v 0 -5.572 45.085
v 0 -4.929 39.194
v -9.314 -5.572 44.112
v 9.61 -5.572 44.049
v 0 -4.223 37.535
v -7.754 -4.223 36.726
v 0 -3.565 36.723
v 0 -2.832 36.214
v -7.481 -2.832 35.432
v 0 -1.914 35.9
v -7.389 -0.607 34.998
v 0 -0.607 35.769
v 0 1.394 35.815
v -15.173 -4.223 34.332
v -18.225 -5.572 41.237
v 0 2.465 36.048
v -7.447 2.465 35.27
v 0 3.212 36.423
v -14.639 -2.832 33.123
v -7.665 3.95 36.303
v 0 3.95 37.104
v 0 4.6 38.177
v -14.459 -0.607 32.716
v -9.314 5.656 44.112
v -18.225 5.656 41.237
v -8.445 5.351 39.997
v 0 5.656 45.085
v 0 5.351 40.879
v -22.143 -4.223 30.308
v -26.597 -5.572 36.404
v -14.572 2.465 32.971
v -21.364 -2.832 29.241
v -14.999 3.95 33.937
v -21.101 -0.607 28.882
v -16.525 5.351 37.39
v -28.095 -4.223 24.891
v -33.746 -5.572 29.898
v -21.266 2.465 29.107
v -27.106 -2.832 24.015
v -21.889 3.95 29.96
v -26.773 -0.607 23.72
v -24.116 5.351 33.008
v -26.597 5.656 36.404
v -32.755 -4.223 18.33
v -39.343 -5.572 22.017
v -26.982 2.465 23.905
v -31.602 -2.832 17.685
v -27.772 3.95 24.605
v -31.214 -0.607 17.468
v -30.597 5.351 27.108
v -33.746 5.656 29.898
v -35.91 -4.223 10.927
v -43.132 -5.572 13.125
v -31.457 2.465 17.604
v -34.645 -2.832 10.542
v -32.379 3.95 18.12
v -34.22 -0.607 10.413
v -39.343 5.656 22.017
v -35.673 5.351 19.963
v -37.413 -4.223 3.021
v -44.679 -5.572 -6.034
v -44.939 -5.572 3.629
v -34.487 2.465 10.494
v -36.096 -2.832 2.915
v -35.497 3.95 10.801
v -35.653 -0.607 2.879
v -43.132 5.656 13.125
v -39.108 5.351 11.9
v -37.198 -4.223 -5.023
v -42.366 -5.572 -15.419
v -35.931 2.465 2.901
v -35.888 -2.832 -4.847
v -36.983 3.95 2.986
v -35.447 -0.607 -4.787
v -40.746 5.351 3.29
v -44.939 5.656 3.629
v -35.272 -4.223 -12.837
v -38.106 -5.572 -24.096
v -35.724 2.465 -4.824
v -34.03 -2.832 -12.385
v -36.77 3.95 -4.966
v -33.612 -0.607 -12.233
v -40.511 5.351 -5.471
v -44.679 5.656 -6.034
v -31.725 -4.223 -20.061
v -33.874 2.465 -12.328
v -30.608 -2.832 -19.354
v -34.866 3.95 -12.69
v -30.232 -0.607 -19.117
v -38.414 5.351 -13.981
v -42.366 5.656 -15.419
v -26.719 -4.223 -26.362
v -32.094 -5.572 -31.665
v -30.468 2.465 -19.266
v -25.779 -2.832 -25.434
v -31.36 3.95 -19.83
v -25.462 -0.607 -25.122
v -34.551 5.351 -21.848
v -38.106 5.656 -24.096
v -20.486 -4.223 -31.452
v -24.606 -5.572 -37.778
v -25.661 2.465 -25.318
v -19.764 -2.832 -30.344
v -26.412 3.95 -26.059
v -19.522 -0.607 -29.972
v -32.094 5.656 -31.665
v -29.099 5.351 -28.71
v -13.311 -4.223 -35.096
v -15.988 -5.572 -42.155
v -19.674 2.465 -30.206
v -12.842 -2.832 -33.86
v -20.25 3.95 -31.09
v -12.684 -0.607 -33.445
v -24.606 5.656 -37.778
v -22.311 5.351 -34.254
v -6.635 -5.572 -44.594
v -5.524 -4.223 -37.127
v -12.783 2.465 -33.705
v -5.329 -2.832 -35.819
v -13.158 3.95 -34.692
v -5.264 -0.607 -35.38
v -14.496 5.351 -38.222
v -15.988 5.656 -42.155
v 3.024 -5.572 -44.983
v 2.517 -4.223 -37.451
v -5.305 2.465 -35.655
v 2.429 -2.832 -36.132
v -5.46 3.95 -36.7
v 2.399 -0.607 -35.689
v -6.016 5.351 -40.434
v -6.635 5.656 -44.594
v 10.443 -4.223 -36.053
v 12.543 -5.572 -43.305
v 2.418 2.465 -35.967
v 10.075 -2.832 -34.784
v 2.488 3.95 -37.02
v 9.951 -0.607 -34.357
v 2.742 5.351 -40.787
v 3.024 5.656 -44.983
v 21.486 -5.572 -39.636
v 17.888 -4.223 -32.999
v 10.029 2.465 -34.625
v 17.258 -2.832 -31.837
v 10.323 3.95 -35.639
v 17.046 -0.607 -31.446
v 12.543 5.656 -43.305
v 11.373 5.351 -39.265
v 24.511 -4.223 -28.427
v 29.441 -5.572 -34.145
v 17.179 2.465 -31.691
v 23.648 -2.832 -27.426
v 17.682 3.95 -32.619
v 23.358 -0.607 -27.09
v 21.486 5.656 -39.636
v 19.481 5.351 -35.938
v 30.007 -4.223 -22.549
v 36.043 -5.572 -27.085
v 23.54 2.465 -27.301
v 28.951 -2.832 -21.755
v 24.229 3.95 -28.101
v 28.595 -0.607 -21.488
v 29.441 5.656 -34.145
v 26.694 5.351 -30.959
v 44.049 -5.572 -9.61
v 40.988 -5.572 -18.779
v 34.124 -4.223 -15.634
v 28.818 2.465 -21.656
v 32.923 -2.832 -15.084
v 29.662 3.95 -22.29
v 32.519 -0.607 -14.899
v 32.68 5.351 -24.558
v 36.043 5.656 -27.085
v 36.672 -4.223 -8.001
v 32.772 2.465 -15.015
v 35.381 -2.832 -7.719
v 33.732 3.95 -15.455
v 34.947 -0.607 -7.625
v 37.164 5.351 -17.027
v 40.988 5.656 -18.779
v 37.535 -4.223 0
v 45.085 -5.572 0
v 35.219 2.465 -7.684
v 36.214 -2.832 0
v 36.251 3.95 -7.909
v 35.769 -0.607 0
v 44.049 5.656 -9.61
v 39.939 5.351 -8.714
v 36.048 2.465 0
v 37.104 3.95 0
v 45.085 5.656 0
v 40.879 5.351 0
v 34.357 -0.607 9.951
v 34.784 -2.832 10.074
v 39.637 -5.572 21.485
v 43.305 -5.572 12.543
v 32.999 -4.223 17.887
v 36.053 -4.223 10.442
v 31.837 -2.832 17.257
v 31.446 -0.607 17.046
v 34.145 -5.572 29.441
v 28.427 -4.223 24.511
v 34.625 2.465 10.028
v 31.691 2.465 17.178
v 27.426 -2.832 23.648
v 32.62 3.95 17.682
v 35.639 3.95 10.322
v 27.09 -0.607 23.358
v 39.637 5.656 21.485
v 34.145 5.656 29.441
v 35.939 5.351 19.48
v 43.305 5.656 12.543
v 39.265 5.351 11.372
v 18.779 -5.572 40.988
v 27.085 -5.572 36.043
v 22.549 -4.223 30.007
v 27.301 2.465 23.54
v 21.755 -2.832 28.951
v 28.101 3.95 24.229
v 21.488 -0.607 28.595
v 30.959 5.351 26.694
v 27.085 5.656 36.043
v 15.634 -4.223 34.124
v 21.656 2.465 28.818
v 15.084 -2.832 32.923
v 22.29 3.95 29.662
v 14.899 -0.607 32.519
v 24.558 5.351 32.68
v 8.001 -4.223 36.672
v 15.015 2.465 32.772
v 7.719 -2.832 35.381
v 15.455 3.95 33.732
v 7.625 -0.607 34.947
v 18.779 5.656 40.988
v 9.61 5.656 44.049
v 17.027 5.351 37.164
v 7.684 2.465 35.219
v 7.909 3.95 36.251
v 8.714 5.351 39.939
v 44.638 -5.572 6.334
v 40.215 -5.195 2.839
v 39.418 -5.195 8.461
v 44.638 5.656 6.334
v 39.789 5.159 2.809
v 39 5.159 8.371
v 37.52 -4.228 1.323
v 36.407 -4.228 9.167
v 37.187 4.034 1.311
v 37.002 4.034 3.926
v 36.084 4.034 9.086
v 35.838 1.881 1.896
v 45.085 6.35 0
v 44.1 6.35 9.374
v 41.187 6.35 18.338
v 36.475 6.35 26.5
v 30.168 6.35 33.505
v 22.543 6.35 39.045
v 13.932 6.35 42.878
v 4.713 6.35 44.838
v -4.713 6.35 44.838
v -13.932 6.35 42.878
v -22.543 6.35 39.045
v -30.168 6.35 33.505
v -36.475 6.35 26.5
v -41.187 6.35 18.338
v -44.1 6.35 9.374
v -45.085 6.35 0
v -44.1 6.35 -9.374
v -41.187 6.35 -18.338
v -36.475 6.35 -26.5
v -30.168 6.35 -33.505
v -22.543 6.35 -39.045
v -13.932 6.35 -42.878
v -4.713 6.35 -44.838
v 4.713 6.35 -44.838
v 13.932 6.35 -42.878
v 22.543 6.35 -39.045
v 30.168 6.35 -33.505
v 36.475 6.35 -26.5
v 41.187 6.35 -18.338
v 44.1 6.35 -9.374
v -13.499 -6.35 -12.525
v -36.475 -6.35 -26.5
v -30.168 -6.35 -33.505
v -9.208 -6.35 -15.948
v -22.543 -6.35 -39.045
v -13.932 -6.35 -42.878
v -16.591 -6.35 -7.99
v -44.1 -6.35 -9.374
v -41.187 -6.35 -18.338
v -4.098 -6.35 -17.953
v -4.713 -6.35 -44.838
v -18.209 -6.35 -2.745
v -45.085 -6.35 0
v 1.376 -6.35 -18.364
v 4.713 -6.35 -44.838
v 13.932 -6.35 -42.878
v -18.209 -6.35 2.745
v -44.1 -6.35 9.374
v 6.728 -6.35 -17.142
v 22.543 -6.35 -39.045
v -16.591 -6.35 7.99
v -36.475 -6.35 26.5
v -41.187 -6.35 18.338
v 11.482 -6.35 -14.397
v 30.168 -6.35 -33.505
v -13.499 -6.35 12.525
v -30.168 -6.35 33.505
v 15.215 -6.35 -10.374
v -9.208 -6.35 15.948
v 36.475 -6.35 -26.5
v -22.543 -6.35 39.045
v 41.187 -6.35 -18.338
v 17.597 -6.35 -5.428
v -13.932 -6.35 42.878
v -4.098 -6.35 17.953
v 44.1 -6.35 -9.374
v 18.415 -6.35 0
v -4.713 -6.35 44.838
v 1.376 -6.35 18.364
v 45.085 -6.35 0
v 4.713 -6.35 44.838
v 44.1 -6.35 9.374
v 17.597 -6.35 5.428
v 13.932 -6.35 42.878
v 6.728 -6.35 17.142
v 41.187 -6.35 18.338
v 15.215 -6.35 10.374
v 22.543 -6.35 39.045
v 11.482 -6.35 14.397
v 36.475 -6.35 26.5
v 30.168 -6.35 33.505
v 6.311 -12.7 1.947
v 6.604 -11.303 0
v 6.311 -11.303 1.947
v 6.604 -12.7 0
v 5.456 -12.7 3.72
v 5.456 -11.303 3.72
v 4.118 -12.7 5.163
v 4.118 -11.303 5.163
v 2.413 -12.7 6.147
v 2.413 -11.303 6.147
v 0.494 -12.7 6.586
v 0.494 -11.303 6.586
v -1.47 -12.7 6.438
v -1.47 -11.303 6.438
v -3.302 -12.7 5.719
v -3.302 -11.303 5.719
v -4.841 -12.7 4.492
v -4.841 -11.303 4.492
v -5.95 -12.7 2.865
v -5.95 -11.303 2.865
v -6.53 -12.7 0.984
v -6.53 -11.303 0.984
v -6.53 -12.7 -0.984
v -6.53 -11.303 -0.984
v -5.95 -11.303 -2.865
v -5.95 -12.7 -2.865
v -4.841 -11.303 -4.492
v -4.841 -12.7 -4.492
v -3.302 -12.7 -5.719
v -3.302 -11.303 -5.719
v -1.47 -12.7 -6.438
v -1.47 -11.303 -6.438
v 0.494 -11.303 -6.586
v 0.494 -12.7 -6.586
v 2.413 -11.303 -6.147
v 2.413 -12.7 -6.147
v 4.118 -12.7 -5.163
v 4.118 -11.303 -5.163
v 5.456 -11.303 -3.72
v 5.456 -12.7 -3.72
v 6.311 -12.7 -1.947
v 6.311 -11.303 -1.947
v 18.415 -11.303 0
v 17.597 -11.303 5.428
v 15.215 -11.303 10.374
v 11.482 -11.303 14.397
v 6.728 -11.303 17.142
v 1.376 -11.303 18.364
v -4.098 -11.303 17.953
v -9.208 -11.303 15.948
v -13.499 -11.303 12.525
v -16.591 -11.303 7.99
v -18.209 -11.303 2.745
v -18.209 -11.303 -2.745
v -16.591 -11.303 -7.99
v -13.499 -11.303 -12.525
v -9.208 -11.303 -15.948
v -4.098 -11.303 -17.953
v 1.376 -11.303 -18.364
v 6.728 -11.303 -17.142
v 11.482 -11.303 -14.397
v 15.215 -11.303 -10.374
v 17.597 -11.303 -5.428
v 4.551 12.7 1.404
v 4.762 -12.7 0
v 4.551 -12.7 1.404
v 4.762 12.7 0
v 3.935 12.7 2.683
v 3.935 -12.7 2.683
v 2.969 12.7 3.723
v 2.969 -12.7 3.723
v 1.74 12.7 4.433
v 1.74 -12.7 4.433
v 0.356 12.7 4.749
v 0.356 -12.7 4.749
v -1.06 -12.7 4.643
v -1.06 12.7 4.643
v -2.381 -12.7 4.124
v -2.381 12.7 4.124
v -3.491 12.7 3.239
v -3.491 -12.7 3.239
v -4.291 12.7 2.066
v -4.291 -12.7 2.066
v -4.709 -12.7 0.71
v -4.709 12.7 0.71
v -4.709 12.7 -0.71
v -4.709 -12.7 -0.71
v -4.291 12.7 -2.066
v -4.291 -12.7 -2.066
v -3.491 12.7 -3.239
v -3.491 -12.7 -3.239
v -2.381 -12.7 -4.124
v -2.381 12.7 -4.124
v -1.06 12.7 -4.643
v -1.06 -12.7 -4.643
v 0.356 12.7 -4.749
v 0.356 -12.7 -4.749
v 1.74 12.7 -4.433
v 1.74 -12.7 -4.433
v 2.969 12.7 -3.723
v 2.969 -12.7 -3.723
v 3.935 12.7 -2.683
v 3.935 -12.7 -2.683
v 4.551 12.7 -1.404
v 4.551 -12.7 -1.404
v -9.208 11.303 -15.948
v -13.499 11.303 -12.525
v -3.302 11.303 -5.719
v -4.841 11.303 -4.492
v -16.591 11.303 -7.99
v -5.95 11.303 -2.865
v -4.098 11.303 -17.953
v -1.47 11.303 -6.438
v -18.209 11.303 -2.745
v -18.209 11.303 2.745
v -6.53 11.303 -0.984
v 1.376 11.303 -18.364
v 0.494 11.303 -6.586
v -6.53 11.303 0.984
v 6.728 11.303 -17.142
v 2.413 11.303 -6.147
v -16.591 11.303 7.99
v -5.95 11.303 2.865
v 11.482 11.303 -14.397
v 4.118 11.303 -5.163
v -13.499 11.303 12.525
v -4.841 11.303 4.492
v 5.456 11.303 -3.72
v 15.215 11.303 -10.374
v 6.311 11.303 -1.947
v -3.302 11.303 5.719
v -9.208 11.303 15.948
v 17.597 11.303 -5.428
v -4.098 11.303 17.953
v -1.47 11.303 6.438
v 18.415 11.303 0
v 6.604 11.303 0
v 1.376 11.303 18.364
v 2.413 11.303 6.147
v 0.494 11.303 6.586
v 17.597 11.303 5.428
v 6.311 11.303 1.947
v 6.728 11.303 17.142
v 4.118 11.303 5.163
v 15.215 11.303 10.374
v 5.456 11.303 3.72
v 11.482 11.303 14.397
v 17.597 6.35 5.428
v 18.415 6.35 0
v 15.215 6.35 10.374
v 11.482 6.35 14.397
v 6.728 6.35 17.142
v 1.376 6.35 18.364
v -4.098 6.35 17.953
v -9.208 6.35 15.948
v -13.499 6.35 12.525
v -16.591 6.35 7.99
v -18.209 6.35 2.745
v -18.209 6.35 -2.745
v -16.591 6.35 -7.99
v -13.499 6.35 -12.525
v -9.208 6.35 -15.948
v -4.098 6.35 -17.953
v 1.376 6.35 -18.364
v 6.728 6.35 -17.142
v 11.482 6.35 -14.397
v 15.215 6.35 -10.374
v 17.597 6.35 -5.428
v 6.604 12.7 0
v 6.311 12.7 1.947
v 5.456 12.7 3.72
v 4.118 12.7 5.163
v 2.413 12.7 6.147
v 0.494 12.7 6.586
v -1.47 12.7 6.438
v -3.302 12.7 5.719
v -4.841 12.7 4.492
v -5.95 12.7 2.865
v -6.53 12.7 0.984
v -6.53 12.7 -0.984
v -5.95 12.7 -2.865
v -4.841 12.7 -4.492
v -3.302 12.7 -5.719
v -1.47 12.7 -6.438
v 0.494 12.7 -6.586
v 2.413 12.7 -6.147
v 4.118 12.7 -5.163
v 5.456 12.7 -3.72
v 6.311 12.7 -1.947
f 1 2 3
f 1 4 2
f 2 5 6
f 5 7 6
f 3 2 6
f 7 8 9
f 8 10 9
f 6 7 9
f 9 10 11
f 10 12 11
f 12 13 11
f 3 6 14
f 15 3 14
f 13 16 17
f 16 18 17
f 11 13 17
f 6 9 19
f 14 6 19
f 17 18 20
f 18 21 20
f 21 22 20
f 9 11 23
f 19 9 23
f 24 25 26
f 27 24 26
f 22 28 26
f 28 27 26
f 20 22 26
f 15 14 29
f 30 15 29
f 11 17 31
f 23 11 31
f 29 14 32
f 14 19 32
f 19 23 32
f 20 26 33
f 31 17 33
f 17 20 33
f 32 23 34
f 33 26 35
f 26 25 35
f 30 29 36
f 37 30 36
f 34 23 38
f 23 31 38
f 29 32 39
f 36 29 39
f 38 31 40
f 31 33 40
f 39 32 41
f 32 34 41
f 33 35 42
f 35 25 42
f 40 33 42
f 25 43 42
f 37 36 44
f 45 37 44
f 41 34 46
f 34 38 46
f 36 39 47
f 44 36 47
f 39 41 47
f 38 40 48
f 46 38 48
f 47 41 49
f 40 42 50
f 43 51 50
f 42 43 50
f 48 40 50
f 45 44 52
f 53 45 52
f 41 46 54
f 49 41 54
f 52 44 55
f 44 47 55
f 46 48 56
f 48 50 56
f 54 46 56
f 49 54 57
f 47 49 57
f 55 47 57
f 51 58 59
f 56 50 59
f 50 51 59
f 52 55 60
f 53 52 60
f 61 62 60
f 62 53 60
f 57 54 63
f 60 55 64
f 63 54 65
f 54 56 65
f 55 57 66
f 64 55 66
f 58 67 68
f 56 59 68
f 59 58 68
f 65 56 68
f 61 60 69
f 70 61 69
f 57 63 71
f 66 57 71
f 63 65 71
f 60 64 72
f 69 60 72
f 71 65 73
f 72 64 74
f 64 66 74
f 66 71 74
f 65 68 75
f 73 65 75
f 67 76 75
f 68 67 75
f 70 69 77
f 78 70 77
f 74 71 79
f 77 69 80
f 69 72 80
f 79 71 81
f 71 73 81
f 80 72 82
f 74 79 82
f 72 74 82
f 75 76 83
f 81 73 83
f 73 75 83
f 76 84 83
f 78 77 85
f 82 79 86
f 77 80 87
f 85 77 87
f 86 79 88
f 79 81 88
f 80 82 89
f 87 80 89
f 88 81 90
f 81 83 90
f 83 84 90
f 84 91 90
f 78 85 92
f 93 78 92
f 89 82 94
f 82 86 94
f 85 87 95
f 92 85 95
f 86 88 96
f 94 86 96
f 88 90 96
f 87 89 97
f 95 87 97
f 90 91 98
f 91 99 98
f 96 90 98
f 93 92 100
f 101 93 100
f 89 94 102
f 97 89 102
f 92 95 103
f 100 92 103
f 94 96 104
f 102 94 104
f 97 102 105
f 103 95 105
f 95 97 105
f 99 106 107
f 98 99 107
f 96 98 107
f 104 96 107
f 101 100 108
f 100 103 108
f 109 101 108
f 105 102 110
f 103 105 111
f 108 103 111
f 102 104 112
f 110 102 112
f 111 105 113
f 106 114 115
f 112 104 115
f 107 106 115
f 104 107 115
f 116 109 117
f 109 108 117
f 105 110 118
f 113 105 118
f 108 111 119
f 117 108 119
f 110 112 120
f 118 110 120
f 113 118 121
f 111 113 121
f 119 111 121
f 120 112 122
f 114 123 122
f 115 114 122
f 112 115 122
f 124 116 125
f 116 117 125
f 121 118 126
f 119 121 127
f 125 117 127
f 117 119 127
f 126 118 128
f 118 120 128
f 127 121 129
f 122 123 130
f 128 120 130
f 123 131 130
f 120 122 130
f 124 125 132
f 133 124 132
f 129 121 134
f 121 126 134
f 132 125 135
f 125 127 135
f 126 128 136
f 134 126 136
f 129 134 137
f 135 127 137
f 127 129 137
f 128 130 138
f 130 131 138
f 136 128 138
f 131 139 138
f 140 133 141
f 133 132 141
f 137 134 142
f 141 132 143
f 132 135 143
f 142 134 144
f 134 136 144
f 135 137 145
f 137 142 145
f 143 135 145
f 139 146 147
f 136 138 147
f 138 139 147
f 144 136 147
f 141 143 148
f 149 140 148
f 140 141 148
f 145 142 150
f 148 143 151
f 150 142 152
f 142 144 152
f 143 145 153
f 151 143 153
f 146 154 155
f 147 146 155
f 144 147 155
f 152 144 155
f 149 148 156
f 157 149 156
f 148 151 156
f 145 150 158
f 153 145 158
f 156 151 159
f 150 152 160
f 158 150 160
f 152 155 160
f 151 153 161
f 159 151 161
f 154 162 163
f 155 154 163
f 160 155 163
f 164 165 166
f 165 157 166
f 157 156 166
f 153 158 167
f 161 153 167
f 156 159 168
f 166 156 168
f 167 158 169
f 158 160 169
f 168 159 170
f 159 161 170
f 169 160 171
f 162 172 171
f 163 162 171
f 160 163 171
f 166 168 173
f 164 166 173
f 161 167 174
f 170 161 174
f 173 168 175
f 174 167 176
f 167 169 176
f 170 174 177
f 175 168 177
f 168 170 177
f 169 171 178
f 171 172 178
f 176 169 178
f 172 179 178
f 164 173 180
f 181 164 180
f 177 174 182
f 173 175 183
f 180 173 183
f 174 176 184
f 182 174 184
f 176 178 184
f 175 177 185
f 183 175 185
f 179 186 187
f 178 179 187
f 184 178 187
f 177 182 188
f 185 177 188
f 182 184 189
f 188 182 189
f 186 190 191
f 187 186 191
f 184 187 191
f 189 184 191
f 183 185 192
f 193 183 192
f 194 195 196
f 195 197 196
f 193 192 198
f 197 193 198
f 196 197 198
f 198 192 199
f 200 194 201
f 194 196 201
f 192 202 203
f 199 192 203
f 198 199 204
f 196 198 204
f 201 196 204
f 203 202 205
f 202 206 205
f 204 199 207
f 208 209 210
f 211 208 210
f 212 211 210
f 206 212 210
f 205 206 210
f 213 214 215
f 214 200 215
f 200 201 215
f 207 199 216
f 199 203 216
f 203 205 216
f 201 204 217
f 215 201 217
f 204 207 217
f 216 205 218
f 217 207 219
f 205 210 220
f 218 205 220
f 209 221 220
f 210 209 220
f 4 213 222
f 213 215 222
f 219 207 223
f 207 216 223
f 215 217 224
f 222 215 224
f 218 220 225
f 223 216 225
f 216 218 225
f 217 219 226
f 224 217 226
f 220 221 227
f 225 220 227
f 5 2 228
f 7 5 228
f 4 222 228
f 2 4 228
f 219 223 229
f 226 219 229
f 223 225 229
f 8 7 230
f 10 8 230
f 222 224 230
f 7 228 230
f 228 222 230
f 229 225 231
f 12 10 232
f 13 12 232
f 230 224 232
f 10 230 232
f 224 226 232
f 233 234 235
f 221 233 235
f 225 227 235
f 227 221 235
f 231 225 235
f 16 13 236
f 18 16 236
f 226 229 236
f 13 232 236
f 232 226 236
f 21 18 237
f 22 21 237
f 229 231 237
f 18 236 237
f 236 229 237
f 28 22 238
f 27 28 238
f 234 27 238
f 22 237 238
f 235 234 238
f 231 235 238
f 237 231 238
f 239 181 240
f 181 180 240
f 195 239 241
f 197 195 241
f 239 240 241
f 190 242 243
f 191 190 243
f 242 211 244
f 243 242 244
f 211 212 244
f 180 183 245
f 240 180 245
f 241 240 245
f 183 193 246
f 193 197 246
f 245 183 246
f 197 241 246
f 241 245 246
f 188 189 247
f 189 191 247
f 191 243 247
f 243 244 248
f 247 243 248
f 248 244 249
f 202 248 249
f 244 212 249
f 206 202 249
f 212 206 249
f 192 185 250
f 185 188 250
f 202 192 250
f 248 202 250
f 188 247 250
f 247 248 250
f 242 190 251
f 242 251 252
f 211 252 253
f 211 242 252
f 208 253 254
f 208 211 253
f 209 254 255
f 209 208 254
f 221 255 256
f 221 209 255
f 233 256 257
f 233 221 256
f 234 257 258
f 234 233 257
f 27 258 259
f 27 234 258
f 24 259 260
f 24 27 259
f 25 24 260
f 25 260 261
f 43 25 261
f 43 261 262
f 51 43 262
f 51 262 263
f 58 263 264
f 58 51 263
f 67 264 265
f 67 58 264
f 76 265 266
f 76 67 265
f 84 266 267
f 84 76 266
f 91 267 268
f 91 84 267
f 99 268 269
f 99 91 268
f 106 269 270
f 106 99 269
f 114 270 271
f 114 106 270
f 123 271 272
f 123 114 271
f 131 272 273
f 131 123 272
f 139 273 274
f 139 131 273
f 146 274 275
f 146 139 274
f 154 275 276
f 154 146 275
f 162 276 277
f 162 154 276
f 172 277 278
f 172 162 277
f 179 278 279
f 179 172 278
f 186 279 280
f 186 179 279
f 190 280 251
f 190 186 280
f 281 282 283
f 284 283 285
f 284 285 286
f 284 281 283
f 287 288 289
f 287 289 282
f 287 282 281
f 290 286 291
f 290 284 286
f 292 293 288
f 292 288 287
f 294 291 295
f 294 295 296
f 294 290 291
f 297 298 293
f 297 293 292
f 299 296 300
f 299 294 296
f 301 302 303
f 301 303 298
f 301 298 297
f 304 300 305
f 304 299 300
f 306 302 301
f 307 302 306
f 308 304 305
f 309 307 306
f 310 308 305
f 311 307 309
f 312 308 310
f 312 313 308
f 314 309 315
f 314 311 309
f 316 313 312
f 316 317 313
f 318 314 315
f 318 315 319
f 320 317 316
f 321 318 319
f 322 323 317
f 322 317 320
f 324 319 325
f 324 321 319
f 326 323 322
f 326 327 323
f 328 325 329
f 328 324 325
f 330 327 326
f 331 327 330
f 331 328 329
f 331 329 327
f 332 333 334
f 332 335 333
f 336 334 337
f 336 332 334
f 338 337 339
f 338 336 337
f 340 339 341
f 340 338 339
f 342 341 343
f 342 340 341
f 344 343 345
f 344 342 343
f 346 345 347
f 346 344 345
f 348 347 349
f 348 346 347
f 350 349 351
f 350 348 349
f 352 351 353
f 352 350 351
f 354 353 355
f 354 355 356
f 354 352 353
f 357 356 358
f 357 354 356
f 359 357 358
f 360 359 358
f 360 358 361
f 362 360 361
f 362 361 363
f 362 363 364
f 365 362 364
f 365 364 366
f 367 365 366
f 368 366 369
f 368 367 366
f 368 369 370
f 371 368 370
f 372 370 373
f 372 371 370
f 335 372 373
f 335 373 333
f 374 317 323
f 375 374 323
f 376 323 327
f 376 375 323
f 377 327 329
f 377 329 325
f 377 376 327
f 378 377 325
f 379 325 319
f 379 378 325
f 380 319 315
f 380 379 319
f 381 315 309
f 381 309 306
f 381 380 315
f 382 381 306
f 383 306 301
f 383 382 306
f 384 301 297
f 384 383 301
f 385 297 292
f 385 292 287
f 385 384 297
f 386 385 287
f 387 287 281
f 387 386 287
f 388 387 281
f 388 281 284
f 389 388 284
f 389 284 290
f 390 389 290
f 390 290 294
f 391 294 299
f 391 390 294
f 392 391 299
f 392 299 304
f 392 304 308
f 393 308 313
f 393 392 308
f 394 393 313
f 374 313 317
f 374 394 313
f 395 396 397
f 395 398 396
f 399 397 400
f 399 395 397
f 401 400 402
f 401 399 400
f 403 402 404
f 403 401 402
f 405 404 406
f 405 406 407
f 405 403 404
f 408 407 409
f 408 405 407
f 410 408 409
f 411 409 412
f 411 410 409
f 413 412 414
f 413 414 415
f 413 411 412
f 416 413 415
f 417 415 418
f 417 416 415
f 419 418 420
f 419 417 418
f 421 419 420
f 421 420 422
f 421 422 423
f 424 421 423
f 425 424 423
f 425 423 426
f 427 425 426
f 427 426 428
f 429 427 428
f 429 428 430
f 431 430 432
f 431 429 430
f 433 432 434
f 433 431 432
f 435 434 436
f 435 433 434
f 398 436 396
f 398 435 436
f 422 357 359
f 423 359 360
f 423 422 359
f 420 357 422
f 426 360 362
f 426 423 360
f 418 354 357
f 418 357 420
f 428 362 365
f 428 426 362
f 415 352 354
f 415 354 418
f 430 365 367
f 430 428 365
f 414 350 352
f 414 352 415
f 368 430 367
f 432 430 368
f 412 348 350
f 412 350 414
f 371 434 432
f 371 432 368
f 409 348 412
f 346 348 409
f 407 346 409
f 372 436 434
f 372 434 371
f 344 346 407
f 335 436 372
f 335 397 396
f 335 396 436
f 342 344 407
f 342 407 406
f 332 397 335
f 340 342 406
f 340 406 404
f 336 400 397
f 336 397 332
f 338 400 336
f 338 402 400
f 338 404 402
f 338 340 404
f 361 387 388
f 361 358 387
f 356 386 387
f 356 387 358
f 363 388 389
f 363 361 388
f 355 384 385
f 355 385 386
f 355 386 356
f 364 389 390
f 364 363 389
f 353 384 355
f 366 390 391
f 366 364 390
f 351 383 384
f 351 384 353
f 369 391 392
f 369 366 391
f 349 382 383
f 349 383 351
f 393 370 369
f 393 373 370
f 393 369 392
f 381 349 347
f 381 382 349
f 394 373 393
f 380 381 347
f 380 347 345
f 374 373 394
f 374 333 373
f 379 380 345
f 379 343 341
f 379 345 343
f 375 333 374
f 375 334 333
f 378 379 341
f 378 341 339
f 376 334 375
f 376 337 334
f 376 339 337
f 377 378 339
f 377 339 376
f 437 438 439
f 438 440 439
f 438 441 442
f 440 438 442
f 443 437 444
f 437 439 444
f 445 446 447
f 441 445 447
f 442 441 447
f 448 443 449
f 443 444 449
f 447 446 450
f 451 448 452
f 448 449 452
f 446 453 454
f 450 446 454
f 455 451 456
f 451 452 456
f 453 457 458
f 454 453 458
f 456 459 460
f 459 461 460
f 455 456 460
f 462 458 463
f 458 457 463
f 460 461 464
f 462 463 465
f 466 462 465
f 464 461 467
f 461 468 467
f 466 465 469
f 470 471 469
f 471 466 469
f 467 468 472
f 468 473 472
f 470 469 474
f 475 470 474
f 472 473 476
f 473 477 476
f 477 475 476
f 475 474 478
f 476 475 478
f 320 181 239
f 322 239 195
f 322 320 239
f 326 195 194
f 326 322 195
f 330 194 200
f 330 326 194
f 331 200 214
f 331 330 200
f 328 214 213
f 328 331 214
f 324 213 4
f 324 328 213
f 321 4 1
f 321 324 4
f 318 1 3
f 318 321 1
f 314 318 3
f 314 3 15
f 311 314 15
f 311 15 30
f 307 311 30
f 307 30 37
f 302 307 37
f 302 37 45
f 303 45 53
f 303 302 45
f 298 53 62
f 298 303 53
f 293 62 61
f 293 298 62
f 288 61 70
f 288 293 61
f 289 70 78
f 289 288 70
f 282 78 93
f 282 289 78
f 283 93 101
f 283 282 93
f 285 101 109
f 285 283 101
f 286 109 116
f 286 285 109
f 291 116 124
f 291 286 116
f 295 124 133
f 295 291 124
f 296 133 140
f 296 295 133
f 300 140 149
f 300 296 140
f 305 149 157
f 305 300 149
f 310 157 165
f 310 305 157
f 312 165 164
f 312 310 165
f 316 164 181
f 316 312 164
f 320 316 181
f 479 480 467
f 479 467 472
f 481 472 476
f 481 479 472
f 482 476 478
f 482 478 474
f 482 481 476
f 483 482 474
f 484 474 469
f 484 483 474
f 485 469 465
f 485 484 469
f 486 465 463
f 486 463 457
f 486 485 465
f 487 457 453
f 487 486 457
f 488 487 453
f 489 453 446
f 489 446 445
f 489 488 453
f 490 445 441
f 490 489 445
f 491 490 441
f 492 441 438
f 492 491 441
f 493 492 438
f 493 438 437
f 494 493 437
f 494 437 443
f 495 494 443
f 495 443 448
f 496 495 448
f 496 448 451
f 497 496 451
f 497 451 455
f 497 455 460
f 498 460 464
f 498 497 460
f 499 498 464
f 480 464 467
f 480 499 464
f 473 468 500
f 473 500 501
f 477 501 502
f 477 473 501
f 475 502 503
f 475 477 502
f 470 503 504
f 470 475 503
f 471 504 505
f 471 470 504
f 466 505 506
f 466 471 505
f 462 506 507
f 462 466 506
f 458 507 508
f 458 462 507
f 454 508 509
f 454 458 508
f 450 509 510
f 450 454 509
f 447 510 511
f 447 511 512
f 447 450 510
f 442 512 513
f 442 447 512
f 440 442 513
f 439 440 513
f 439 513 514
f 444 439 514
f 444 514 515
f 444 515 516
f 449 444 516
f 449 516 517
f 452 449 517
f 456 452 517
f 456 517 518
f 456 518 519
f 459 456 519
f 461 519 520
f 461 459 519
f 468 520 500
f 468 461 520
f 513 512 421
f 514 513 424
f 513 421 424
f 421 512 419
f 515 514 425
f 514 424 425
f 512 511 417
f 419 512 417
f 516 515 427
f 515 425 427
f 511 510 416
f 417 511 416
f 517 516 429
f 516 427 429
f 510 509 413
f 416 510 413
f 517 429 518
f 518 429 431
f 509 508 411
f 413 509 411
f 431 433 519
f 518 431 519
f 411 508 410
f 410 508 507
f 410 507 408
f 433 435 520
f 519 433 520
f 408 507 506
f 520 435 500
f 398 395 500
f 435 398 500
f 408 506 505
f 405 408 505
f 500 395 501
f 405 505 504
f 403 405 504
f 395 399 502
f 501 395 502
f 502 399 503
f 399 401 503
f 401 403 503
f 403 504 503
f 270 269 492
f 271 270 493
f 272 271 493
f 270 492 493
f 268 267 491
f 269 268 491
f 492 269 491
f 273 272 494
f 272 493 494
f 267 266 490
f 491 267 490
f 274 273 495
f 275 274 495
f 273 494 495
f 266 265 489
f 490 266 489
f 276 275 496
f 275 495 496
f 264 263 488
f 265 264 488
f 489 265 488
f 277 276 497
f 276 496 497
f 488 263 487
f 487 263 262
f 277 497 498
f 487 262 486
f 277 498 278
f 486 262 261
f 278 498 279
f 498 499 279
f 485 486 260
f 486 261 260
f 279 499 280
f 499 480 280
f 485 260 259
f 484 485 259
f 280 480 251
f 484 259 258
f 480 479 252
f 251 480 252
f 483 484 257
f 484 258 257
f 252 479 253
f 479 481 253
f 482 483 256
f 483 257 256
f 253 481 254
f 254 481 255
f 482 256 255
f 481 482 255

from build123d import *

# Parameters (mm, degrees)
F0_R     = 45.085
F0_R_2   = 18.415
F1_DEPTH = 6.35
F0_R_3   = 6.604
F2_DEPTH = 11.303
F0_R_4   = 4.7625
F3_DEPTH = 12.7


with BuildPart() as f1:
    # F0 (on Front) → F1 (new body, symmetric)
    with BuildSketch(Plane.XZ):
        Circle(F0_R)
        Circle(F0_R_2, mode=Mode.SUBTRACT)
    extrude(amount=F1_DEPTH, both=True)

    # F0 (on Front) → F2 (join, symmetric)
    with BuildSketch(Plane.XZ):
        Circle(F0_R_2)
        Circle(F0_R_3, mode=Mode.SUBTRACT)
    extrude(amount=F2_DEPTH, both=True)

    # F0 (on Front) → F3 (join, symmetric)
    with BuildSketch(Plane.XZ):
        Circle(F0_R_3)
        Circle(F0_R_4, mode=Mode.SUBTRACT)
    extrude(amount=F3_DEPTH, both=True)

    # F4 (on Right) → F5 (revolve, cut)
    with BuildSketch(Plane.YZ):
        with BuildLine():
            Line((5.6580589153, 45.2881976962), (-5.5725798011, 45.2881976962))
            add(Edge.make_bspline(
                [(-5.5725798011, 45.2881976962), (-5.5725798011, 35.8861179518), (-0.0057704546, 35.6446596601), (5.6060645729, 35.8773358166), (5.6580589153, 45.2881976962)],
                knots=[0, 0, 0, 0, 0.4995092449, 1, 1, 1, 1], degree=3))
        make_face()
    revolve(axis=Axis((0, 0, 0), (0, -1, 0)), mode=Mode.SUBTRACT)


solid = f1.part
